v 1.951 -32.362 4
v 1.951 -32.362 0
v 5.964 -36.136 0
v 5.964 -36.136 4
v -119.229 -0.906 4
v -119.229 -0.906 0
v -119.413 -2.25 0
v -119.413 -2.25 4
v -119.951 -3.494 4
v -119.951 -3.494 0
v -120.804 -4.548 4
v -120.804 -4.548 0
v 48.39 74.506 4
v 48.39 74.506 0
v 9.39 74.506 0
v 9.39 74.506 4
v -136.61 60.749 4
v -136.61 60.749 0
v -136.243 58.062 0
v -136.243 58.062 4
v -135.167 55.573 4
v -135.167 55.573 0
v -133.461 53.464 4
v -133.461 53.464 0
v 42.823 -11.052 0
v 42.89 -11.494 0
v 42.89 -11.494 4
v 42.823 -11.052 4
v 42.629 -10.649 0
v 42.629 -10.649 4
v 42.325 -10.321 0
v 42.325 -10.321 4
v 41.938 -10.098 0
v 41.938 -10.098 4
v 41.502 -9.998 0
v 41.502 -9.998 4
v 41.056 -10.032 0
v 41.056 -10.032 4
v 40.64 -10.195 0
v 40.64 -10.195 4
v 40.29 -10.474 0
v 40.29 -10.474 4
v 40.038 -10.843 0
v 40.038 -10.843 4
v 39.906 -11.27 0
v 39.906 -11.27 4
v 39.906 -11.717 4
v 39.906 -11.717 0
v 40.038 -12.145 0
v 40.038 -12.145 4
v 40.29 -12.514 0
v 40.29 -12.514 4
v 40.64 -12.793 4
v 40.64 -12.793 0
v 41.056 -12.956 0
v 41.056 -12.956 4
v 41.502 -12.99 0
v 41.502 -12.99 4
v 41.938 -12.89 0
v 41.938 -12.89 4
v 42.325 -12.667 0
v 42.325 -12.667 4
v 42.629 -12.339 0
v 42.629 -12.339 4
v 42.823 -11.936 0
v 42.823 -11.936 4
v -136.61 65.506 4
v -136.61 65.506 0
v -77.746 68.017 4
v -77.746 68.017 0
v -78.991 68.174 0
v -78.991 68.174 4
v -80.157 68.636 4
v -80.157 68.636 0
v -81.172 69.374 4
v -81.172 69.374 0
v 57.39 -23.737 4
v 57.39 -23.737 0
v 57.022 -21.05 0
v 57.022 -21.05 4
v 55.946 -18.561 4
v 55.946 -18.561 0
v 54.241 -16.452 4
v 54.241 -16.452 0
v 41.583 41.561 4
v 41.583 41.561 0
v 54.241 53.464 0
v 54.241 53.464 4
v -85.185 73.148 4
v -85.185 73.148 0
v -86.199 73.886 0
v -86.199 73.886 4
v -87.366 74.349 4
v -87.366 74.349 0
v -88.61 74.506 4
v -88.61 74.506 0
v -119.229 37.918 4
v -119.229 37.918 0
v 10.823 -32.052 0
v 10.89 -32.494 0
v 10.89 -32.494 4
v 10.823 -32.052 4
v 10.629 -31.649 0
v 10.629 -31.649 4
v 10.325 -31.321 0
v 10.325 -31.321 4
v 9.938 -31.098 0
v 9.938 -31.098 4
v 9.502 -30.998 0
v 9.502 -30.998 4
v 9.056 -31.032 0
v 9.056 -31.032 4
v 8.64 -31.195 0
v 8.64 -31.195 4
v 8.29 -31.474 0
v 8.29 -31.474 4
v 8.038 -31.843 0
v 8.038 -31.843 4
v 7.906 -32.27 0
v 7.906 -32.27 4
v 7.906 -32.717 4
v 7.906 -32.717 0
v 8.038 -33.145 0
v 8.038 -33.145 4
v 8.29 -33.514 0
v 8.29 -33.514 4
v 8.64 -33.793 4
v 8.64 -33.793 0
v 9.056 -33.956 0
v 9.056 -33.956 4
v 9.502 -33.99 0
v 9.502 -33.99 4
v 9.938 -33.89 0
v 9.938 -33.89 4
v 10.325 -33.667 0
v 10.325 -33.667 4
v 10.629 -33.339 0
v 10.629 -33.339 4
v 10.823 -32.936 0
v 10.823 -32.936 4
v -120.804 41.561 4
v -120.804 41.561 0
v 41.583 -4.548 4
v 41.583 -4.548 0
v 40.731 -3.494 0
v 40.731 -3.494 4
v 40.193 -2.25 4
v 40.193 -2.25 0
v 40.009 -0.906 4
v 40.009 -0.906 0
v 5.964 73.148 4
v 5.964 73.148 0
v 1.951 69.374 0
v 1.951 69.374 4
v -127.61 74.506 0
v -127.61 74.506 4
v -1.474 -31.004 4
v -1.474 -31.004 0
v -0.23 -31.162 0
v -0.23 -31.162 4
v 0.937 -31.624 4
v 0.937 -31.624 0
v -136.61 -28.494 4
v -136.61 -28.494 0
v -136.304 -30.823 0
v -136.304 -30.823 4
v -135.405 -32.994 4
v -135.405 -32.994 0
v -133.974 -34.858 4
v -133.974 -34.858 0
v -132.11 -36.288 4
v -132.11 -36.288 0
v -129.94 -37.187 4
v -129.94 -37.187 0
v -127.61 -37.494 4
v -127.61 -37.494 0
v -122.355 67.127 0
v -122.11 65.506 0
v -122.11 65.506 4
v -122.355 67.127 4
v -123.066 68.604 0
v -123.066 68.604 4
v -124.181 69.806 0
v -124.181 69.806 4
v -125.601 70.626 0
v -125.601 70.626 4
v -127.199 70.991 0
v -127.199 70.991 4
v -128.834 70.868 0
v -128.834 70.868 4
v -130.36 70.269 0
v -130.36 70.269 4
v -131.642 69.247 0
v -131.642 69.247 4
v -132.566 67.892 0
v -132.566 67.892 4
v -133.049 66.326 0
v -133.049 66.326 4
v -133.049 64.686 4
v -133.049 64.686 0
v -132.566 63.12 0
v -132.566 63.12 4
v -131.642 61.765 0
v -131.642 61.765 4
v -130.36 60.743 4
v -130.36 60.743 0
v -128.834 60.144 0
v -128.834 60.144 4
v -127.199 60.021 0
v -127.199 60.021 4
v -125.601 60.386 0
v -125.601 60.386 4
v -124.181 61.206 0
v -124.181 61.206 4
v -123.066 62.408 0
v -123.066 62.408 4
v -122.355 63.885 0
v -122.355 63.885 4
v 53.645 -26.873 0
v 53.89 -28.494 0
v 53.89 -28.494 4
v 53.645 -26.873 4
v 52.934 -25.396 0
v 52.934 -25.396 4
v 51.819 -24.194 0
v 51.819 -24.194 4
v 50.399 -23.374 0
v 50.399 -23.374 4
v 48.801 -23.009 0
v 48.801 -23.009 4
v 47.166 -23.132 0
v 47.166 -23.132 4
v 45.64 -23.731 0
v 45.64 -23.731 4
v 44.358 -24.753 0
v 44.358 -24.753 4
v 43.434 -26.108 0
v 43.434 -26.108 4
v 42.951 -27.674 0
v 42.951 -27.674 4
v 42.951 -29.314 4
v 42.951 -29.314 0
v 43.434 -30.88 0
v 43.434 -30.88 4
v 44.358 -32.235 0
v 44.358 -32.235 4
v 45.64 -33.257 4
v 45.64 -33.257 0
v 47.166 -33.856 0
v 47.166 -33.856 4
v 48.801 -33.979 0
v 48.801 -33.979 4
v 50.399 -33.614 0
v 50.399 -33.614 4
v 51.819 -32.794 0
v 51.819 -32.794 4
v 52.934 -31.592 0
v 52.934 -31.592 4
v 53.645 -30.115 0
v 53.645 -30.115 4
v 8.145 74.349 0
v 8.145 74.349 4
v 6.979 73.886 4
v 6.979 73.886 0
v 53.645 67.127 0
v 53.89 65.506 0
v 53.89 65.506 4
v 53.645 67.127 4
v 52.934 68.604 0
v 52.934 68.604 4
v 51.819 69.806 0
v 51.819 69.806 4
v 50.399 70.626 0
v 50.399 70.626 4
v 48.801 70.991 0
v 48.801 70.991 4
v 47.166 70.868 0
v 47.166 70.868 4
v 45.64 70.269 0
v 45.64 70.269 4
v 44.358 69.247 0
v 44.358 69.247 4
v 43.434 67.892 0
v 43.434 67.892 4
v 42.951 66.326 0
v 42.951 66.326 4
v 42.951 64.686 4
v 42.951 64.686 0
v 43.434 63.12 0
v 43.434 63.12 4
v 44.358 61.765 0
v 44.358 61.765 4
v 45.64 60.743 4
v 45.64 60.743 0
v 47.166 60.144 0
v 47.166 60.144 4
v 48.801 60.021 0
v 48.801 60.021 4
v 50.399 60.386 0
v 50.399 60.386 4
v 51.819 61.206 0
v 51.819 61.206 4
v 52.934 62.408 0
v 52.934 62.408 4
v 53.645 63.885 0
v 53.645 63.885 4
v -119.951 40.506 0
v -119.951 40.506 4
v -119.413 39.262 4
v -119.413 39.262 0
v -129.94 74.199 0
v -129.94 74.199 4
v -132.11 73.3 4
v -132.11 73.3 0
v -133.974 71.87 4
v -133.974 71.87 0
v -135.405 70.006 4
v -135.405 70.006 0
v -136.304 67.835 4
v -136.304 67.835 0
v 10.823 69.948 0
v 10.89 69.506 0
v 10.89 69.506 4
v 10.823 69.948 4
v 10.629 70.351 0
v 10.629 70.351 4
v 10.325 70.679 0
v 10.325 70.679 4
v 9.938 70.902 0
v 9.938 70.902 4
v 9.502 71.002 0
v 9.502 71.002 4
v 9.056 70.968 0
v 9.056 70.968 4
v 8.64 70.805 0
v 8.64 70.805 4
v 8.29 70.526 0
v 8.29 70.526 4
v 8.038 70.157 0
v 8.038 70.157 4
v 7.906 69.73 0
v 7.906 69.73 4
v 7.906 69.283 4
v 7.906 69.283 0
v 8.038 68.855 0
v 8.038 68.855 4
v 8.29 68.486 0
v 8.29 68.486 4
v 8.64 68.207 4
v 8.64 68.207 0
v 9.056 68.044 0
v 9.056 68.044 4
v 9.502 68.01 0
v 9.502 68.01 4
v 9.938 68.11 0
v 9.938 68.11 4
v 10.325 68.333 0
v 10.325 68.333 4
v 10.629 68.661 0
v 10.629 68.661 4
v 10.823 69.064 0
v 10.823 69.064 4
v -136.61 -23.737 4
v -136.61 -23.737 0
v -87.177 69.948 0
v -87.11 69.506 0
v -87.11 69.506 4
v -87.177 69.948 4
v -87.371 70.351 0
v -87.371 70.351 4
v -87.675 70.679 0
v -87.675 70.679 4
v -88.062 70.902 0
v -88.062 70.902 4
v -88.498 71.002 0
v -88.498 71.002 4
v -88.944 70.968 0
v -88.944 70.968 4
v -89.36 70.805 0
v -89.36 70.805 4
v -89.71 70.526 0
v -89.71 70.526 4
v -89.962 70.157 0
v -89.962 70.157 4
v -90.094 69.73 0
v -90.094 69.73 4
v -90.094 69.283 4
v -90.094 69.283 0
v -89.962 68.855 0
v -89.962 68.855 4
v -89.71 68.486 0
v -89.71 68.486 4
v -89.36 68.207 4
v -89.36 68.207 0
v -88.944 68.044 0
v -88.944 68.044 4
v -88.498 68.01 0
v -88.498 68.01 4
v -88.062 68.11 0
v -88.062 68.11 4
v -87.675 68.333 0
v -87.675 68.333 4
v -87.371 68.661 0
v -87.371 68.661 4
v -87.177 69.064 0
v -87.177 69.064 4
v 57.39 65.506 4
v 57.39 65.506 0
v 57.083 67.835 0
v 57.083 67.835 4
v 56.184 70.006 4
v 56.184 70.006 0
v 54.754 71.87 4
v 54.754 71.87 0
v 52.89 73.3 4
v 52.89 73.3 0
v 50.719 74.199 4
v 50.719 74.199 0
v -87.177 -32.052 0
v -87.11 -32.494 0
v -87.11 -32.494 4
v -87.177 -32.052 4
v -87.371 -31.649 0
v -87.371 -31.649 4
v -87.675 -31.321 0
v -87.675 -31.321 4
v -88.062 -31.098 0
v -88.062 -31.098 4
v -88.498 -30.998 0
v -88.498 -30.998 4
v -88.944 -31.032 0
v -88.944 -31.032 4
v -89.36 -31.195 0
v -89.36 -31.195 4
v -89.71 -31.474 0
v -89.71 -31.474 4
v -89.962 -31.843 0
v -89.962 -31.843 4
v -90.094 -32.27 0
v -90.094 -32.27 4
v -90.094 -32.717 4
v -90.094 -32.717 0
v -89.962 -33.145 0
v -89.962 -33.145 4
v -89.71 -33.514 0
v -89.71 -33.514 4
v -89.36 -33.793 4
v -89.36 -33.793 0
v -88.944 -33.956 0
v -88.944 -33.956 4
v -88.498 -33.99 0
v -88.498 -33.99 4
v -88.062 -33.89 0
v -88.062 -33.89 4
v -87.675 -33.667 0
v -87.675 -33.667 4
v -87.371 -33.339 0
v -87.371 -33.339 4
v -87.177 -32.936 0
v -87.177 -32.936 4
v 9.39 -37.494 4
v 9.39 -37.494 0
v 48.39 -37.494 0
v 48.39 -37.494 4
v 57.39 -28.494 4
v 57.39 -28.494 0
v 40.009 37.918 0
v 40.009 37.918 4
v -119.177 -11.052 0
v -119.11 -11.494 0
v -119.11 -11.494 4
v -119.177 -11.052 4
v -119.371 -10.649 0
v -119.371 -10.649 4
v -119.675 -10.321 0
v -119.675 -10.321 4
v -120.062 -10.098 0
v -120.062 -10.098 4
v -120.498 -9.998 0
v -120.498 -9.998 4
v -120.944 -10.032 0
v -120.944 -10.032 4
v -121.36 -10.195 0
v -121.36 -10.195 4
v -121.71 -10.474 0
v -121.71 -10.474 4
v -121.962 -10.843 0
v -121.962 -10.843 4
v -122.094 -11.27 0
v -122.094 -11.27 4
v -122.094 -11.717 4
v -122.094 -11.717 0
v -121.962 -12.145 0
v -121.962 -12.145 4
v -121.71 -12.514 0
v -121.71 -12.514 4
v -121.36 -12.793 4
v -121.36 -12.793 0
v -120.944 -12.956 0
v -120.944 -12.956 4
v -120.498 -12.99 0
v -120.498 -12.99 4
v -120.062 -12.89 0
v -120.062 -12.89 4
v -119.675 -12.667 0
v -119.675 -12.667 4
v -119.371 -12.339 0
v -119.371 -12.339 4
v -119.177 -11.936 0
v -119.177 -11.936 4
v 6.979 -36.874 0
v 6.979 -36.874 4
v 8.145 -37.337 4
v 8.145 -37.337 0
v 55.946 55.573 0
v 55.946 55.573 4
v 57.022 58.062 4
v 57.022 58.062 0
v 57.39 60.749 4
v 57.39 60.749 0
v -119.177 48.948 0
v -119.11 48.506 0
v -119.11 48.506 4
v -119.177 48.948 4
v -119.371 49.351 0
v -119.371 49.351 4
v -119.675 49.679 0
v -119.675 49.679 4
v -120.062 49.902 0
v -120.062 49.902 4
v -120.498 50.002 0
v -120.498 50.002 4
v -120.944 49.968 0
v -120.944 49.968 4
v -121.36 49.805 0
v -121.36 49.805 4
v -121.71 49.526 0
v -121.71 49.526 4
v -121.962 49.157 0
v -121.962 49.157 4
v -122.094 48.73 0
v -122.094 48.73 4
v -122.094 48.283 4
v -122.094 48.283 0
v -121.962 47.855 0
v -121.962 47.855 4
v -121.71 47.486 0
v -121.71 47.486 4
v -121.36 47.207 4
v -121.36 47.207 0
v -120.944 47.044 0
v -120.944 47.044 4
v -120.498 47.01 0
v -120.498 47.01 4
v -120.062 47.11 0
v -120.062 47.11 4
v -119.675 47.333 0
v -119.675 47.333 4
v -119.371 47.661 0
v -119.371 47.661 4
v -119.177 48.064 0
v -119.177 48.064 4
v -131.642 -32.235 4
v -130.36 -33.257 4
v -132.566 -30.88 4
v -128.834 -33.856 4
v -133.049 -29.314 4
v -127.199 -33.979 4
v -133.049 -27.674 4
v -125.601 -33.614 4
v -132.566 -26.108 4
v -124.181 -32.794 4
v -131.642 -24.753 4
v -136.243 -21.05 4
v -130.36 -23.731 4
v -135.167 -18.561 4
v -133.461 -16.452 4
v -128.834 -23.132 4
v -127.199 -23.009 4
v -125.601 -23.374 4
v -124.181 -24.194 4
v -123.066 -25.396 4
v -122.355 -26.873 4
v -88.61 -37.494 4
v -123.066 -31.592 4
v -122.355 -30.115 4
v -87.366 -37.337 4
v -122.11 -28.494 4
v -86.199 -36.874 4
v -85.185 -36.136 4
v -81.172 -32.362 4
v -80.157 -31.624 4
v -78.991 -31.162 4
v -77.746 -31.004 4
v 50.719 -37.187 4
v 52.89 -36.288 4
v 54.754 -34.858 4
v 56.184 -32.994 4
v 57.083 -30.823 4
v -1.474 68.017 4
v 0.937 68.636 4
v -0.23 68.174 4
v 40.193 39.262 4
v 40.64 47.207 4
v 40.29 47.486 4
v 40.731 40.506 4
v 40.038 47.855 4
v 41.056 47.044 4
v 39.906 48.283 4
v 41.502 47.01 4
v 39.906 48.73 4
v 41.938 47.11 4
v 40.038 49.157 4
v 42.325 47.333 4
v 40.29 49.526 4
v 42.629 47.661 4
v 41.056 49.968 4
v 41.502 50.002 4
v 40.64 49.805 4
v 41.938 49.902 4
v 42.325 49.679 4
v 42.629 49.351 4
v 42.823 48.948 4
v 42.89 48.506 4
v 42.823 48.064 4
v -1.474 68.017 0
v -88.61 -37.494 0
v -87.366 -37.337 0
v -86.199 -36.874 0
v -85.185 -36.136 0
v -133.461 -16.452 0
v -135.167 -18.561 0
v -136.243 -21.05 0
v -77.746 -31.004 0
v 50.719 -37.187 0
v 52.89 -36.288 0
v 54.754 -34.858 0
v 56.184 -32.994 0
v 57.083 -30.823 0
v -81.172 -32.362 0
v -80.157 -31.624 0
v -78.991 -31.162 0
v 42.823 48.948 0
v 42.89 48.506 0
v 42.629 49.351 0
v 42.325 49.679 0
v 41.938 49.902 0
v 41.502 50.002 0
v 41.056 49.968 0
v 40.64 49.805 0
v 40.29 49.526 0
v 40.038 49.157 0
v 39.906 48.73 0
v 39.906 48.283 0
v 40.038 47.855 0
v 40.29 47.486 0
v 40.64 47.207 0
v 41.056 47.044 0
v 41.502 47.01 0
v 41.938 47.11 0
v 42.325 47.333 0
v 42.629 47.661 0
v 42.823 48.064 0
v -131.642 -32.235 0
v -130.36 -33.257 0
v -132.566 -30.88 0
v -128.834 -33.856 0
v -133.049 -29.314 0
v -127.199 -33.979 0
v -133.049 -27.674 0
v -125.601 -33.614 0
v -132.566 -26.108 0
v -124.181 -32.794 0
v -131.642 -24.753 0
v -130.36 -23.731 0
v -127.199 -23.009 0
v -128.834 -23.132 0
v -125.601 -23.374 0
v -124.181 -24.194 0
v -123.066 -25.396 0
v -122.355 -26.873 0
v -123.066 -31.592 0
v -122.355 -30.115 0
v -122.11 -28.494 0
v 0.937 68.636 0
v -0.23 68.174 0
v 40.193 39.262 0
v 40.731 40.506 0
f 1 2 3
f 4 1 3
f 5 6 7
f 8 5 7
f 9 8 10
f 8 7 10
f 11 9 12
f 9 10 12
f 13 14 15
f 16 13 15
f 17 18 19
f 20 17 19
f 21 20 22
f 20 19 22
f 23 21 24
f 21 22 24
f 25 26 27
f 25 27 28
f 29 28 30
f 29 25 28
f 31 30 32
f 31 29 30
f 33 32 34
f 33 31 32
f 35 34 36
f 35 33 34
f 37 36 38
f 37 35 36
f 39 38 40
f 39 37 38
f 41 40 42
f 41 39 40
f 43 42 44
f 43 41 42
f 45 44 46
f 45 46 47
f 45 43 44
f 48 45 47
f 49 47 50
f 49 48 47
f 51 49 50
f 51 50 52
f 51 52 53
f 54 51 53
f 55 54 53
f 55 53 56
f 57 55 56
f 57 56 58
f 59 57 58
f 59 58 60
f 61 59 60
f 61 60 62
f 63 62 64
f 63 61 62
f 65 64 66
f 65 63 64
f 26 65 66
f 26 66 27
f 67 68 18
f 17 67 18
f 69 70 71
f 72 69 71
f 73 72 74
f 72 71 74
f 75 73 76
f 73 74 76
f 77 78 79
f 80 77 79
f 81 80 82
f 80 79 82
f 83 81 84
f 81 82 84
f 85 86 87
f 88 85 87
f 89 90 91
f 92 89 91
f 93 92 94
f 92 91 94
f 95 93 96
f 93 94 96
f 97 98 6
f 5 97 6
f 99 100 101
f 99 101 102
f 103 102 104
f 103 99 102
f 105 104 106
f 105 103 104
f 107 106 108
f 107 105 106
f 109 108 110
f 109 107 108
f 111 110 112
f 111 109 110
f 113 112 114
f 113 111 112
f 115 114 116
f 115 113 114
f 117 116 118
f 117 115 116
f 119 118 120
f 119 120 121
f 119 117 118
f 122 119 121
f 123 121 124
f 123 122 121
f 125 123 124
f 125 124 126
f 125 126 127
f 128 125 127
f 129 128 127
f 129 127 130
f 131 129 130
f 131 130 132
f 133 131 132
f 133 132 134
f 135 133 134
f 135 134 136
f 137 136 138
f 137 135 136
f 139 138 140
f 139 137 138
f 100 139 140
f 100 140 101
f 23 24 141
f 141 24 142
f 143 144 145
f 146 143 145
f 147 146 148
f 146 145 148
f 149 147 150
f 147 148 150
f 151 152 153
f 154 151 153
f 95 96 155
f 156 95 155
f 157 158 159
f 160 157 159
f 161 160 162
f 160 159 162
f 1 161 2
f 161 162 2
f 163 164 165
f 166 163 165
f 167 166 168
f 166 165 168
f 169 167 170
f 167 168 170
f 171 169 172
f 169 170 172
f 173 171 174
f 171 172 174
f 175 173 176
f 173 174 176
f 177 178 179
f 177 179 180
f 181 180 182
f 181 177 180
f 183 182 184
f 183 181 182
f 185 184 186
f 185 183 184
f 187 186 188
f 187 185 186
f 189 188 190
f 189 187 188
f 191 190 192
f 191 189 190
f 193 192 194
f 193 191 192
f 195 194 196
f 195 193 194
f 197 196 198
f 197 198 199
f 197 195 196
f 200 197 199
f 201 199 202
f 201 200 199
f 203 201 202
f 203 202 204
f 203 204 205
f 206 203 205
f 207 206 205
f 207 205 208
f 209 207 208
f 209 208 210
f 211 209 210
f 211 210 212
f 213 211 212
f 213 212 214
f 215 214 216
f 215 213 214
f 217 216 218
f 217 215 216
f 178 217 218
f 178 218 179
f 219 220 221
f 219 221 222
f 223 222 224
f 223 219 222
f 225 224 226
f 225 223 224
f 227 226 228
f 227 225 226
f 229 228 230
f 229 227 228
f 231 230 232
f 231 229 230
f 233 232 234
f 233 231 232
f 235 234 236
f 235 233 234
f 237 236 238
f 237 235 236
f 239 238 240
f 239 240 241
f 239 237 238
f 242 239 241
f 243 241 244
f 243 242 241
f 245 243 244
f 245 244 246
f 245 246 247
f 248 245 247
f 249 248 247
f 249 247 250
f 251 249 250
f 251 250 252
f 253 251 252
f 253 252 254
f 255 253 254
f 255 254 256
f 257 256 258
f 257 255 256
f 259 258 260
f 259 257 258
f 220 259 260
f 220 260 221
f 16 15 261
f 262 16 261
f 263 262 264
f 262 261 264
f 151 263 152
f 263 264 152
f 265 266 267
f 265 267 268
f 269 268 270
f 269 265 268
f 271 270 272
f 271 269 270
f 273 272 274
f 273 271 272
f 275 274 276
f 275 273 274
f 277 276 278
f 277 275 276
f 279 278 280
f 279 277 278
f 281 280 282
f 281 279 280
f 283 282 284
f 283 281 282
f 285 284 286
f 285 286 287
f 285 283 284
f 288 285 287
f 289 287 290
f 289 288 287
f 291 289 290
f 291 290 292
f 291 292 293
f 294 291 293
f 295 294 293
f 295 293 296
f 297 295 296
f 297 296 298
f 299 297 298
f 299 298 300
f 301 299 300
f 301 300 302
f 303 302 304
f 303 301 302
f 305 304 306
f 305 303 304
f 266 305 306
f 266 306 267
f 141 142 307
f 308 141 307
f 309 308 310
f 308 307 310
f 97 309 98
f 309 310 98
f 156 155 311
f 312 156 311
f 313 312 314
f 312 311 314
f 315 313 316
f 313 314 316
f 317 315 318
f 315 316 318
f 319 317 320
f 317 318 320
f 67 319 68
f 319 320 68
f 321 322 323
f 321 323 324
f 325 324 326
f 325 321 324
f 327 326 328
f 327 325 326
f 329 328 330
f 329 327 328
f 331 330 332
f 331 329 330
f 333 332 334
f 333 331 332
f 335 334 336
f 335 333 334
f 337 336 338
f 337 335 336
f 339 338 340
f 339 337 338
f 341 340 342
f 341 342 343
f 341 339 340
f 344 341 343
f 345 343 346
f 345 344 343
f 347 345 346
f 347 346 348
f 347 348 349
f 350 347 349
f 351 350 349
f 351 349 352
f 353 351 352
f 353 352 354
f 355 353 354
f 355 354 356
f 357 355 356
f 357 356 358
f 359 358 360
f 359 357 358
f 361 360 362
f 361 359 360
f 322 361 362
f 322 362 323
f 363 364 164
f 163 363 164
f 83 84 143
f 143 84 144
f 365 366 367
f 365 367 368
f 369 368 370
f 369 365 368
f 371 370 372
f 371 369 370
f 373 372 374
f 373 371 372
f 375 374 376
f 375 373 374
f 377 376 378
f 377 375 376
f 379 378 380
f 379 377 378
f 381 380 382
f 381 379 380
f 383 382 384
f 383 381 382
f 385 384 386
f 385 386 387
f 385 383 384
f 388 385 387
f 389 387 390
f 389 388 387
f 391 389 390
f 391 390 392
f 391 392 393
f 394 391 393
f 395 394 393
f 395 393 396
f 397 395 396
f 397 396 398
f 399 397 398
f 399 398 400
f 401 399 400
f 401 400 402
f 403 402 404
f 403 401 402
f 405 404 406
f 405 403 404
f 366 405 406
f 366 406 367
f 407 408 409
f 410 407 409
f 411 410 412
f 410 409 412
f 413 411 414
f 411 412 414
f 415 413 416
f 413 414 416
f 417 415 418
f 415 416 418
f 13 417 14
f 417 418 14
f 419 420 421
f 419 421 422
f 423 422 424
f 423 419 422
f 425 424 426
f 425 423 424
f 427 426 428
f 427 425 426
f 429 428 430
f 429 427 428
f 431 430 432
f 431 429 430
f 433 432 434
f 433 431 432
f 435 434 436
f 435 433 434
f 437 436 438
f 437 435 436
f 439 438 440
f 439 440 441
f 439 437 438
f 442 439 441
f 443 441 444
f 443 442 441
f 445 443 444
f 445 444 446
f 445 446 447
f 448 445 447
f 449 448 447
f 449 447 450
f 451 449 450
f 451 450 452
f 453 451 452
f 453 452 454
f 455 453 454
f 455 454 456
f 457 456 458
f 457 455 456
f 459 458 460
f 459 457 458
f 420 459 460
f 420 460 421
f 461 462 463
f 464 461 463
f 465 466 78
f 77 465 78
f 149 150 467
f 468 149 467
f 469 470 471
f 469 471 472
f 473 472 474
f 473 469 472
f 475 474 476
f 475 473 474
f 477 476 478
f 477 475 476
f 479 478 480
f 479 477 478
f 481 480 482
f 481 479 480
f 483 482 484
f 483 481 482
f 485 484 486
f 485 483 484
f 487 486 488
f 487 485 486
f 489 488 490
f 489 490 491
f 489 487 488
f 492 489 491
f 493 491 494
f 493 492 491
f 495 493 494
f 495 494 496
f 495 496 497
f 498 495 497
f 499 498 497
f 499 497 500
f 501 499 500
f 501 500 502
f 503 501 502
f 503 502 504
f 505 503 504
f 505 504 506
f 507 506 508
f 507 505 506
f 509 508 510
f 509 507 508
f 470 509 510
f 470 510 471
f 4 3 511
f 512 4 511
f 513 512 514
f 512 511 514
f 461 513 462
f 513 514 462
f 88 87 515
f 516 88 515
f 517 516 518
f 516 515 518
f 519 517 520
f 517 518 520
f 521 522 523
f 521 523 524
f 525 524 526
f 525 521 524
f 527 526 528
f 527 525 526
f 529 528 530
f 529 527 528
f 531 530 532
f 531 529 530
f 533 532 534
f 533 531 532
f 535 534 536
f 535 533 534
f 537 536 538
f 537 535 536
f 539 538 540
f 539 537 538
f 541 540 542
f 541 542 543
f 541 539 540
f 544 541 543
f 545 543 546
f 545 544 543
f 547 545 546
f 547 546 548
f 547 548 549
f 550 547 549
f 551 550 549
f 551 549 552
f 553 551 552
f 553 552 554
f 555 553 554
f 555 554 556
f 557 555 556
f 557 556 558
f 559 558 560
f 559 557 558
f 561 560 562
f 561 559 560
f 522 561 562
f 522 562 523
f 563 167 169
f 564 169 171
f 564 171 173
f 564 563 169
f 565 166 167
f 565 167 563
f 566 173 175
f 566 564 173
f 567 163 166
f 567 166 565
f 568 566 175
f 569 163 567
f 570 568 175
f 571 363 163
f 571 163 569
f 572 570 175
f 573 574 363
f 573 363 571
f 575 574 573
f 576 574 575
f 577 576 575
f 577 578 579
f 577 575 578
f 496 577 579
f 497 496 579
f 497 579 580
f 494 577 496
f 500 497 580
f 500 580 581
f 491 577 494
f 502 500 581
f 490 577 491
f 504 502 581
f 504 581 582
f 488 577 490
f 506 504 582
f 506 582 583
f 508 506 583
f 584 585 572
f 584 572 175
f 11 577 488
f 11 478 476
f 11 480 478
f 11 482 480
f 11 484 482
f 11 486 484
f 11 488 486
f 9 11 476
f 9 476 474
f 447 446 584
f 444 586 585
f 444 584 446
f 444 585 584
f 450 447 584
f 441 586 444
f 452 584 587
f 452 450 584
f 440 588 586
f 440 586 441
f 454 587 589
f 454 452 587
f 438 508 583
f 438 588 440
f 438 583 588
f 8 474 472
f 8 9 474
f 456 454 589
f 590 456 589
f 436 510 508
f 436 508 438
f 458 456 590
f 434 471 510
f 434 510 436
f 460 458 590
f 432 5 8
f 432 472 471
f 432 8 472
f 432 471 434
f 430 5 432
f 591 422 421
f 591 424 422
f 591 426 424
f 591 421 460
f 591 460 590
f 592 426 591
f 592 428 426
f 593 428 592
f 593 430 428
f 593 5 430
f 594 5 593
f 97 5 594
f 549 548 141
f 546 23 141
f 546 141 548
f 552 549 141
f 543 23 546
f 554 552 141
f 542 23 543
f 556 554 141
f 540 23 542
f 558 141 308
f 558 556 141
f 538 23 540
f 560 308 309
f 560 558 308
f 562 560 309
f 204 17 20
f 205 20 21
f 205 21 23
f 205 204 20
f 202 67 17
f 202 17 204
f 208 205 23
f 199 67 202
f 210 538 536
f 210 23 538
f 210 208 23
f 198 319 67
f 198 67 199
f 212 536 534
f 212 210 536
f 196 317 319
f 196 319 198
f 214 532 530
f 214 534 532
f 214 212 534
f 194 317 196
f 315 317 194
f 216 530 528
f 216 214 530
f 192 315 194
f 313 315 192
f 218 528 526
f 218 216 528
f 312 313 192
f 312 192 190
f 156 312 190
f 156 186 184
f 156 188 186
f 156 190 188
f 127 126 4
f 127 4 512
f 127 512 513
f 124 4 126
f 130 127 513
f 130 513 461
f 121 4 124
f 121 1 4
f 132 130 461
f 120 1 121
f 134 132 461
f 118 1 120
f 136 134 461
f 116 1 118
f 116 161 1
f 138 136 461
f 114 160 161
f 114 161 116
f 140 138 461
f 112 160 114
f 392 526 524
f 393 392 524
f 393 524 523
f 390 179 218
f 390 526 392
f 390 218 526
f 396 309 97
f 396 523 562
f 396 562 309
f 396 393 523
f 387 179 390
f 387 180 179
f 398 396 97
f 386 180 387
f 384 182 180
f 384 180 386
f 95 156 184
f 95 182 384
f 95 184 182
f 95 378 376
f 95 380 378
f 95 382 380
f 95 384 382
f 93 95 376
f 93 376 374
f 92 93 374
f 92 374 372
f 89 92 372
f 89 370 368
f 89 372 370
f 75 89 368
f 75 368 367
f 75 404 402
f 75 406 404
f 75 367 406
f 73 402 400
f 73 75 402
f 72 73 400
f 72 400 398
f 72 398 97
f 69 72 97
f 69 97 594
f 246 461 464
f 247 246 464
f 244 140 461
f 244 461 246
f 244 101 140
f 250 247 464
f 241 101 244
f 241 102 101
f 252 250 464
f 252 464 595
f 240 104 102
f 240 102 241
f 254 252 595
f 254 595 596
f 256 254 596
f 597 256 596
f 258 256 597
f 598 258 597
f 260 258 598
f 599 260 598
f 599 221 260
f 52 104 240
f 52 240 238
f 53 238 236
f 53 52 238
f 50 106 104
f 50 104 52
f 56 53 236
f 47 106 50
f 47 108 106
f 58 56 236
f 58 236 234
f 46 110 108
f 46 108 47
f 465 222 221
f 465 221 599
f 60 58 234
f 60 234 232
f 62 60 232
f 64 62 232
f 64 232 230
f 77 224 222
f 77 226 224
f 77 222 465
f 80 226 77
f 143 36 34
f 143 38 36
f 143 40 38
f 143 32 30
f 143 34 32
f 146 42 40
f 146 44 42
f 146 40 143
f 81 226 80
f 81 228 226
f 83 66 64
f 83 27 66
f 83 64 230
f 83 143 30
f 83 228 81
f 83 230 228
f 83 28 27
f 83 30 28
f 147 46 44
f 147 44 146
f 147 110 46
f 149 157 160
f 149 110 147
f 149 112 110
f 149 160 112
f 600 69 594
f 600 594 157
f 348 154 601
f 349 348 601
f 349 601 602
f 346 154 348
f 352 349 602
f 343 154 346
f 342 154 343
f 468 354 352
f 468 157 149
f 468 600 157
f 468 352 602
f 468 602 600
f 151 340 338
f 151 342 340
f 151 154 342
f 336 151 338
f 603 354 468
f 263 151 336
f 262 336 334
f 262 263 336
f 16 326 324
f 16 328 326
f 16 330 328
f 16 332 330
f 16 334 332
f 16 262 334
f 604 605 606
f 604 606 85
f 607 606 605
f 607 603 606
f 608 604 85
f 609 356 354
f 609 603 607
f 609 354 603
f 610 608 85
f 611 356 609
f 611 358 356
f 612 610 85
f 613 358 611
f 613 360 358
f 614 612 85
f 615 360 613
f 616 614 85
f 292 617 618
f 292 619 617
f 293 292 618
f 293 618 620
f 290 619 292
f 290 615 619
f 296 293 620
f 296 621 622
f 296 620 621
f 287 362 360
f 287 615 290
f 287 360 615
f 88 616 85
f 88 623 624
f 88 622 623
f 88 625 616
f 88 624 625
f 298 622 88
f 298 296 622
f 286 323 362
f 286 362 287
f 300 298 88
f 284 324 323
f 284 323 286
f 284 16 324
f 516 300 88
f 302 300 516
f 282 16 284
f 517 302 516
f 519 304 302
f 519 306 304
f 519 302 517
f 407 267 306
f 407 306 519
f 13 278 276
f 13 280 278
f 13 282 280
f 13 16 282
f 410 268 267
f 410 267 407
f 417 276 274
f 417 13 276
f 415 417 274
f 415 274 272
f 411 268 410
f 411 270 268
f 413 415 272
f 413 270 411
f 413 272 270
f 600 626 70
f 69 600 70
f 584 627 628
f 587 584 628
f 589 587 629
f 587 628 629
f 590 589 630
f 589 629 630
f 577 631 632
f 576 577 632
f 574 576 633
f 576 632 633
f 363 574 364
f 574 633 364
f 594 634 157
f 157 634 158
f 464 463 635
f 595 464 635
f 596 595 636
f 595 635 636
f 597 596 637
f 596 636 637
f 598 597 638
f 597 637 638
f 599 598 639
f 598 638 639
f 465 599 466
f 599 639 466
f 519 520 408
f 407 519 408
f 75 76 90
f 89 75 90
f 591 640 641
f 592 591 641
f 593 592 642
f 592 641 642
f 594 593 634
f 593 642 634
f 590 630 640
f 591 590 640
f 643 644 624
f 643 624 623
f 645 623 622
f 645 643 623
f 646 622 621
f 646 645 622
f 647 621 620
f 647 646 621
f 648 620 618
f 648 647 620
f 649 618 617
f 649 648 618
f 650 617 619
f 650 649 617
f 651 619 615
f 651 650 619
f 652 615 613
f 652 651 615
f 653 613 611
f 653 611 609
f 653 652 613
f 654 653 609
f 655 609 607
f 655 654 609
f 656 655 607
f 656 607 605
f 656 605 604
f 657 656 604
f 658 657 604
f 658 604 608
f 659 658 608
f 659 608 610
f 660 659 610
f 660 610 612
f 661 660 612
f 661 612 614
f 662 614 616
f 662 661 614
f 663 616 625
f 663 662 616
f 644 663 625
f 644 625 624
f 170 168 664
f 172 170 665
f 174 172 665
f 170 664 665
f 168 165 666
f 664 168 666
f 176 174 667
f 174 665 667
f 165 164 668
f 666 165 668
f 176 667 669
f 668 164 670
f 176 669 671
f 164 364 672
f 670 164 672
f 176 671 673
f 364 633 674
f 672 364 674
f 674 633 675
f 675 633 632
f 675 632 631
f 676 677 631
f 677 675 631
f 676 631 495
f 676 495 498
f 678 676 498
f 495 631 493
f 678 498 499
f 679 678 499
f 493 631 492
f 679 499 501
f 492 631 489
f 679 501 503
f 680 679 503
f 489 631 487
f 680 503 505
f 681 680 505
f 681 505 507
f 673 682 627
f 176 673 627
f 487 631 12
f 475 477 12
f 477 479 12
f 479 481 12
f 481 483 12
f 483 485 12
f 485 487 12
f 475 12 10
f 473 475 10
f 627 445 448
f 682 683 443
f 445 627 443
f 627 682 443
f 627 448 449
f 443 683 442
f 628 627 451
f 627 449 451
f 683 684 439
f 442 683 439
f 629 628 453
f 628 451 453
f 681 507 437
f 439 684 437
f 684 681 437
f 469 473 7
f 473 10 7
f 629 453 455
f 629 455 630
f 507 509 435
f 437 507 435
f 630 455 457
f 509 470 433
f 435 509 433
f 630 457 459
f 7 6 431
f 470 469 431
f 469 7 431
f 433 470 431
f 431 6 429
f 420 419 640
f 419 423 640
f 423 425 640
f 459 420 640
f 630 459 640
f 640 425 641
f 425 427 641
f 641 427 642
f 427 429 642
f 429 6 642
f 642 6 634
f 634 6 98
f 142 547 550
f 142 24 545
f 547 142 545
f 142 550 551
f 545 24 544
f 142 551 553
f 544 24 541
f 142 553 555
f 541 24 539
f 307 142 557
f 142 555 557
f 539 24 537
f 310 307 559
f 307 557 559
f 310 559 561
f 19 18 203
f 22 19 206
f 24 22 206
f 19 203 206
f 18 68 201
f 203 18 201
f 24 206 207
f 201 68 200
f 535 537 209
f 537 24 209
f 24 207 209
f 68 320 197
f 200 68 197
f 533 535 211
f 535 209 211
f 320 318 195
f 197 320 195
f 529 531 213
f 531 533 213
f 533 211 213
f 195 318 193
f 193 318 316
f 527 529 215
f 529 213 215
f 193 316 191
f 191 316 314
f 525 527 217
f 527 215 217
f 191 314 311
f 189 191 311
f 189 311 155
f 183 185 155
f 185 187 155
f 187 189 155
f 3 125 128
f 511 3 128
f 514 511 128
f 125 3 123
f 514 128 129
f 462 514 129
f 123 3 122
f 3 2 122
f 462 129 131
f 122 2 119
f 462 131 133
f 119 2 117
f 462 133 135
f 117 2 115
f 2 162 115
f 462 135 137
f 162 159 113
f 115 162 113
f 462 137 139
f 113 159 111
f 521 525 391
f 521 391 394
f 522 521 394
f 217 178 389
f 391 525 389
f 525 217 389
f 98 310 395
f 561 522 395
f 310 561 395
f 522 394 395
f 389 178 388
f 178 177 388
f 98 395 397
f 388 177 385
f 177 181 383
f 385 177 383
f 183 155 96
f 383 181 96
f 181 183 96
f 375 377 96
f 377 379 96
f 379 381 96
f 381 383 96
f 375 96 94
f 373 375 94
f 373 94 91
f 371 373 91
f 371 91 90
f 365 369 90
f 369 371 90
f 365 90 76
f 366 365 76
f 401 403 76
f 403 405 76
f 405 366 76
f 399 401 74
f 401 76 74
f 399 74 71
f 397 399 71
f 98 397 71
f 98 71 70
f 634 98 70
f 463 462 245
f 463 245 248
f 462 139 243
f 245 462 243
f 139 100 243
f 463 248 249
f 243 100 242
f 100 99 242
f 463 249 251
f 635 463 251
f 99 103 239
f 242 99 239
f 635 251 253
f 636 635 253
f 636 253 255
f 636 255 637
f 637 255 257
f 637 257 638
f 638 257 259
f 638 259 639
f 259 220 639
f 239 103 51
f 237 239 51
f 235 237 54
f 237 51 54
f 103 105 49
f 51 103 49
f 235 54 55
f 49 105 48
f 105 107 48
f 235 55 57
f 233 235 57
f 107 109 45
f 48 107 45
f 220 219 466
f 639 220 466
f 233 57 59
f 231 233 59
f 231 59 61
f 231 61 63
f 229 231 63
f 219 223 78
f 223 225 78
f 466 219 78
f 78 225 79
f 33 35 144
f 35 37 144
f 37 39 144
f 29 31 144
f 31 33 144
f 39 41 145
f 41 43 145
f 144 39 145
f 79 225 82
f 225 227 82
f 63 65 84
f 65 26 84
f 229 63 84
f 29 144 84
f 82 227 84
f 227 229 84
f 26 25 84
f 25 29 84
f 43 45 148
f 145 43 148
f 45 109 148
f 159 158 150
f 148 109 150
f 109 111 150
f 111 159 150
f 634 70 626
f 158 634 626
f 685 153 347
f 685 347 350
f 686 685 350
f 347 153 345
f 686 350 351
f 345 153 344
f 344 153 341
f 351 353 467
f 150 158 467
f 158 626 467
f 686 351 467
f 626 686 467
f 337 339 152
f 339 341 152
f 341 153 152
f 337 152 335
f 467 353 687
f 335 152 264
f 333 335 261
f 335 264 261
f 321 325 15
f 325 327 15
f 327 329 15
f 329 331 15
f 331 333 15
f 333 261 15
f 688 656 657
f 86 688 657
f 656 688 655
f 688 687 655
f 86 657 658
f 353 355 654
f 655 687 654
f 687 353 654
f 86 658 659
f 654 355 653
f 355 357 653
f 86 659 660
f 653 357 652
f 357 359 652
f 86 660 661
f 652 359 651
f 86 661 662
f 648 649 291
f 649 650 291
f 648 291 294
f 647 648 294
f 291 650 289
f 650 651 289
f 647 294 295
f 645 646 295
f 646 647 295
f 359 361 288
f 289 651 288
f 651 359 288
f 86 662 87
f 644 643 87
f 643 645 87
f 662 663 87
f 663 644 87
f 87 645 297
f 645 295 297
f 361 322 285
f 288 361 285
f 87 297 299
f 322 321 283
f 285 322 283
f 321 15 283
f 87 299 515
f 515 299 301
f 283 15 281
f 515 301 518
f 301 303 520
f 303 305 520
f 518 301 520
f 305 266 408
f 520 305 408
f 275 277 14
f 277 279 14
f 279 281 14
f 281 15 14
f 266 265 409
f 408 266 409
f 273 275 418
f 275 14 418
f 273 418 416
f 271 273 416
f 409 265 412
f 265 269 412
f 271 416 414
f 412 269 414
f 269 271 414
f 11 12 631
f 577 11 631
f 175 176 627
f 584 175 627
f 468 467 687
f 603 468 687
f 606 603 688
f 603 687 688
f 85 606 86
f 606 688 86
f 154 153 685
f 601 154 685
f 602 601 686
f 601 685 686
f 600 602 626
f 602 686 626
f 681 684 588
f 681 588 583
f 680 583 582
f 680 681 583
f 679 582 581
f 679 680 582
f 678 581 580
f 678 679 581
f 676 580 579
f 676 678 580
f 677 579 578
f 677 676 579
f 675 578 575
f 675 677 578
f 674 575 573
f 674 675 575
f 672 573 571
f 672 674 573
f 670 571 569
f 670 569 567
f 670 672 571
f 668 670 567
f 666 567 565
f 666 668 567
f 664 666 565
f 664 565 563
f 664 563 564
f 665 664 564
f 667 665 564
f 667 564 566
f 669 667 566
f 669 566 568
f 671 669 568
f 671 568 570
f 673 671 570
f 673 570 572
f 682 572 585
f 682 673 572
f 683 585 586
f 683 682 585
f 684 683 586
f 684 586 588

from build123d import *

# Parameters (mm, degrees)
SKETCH_1_R      = 1.5
SKETCH_1_R_2    = 5.5
EXTRUDE_1_DEPTH = 4


with BuildPart() as part:
    # Эскиз1 → Бобышка-Вытянуть1 (new body)
    with BuildSketch(Plane.XY):
        with BuildLine():
            Line((-1.474172714, 68.016601782), (-77.746457719, 68.016601782))
            ThreePointArc((-77.746457719, 68.016601782), (-79.588811782, 68.368405195), (-81.171907265, 69.374309179))
            Line((-81.171907265, 69.374309179), (-85.184865671, 73.148357023))
            ThreePointArc((-85.184865671, 73.148357023), (-86.767961154, 74.154261006), (-88.610315217, 74.506064419))
            Line((-88.610315217, 74.506064419), (-127.610315217, 74.506064419))
            ThreePointArc((-127.610315217, 74.506064419), (-133.974276247, 71.87002545), (-136.610315217, 65.506064419))
            Line((-136.610315217, 65.506064419), (-136.610315217, 60.749014849))
            ThreePointArc((-136.610315217, 60.749014849), (-135.789339972, 56.780954297), (-133.461214308, 53.464429642))
            Line((-133.461214308, 53.464429642), (-120.803854155, 41.560622533))
            ThreePointArc((-120.803854155, 41.560622533), (-119.639791323, 39.902360205), (-119.229303701, 37.918329929))
            Line((-119.229303701, 37.918329929), (-119.229303701, -0.906201091))
            ThreePointArc((-119.229303701, -0.906201091), (-119.639791323, -2.890231366), (-120.803854155, -4.548493694))
            Line((-120.803854155, -4.548493694), (-133.461214308, -16.452300803))
            ThreePointArc((-133.461214308, -16.452300803), (-135.789339972, -19.768825459), (-136.610315217, -23.73688601))
            Line((-136.610315217, -23.73688601), (-136.610315217, -28.493935581))
            ThreePointArc((-136.610315217, -28.493935581), (-133.974276247, -34.857896611), (-127.610315217, -37.493935581))
            Line((-127.610315217, -37.493935581), (-88.610315217, -37.493935581))
            ThreePointArc((-88.610315217, -37.493935581), (-86.767961154, -37.142132167), (-85.184865671, -36.136228184))
            Line((-85.184865671, -36.136228184), (-81.171907265, -32.36218034))
            ThreePointArc((-81.171907265, -32.36218034), (-79.588811782, -31.356276357), (-77.746457719, -31.004472943))
            Line((-77.746457719, -31.004472943), (-1.474172714, -31.004472943))
            ThreePointArc((-1.474172714, -31.004472943), (0.368181349, -31.356276357), (1.951276832, -32.36218034))
            Line((1.951276832, -32.36218034), (5.964235238, -36.136228184))
            ThreePointArc((5.964235238, -36.136228184), (7.547330721, -37.142132167), (9.389684783, -37.493935581))
            Line((9.389684783, -37.493935581), (48.389684783, -37.493935581))
            ThreePointArc((48.389684783, -37.493935581), (54.753645814, -34.857896611), (57.389684783, -28.493935581))
            Line((57.389684783, -28.493935581), (57.389684783, -23.73688601))
            ThreePointArc((57.389684783, -23.73688601), (56.568709539, -19.768825459), (54.240583875, -16.452300803))
            Line((54.240583875, -16.452300803), (41.583223722, -4.548493694))
            ThreePointArc((41.583223722, -4.548493694), (40.41916089, -2.890231366), (40.008673268, -0.906201091))
            Line((40.008673268, -0.906201091), (40.008673268, 37.918329929))
            ThreePointArc((40.008673268, 37.918329929), (40.41916089, 39.902360205), (41.583223722, 41.560622533))
            Line((41.583223722, 41.560622533), (54.240583875, 53.464429642))
            ThreePointArc((54.240583875, 53.464429642), (56.568709539, 56.780954297), (57.389684783, 60.749014849))
            Line((57.389684783, 60.749014849), (57.389684783, 65.506064419))
            ThreePointArc((57.389684783, 65.506064419), (54.753645814, 71.87002545), (48.389684783, 74.506064419))
            Line((48.389684783, 74.506064419), (9.389684783, 74.506064419))
            ThreePointArc((9.389684783, 74.506064419), (7.547330721, 74.154261006), (5.964235238, 73.148357023))
            Line((5.964235238, 73.148357023), (1.951276832, 69.374309179))
            ThreePointArc((1.951276832, 69.374309179), (0.368181349, 68.368405195), (-1.474172714, 68.016601782))
        make_face()
        with Locations((-88.610315217, 69.506064419)):
            Circle(SKETCH_1_R, mode=Mode.SUBTRACT)
        with Locations((-120.610315217, 48.506064419)):
            Circle(SKETCH_1_R, mode=Mode.SUBTRACT)
        with Locations((-127.610315217, 65.506064419)):
            Circle(SKETCH_1_R_2, mode=Mode.SUBTRACT)
        with Locations((-127.610315217, -28.493935581)):
            Circle(SKETCH_1_R_2, mode=Mode.SUBTRACT)
        with Locations((-120.610315217, -11.493935581)):
            Circle(SKETCH_1_R, mode=Mode.SUBTRACT)
        with Locations((-88.610315217, -32.493935581)):
            Circle(SKETCH_1_R, mode=Mode.SUBTRACT)
        with Locations((9.389684783, -32.493935581)):
            Circle(SKETCH_1_R, mode=Mode.SUBTRACT)
        with Locations((41.389684783, -11.493935581)):
            Circle(SKETCH_1_R, mode=Mode.SUBTRACT)
        with Locations((48.389684783, -28.493935581)):
            Circle(SKETCH_1_R_2, mode=Mode.SUBTRACT)
        with Locations((48.389684783, 65.506064419)):
            Circle(SKETCH_1_R_2, mode=Mode.SUBTRACT)
        with Locations((41.389684783, 48.506064419)):
            Circle(SKETCH_1_R, mode=Mode.SUBTRACT)
        with Locations((9.389684783, 69.506064419)):
            Circle(SKETCH_1_R, mode=Mode.SUBTRACT)
    extrude(amount=EXTRUDE_1_DEPTH)


solid = part.part
